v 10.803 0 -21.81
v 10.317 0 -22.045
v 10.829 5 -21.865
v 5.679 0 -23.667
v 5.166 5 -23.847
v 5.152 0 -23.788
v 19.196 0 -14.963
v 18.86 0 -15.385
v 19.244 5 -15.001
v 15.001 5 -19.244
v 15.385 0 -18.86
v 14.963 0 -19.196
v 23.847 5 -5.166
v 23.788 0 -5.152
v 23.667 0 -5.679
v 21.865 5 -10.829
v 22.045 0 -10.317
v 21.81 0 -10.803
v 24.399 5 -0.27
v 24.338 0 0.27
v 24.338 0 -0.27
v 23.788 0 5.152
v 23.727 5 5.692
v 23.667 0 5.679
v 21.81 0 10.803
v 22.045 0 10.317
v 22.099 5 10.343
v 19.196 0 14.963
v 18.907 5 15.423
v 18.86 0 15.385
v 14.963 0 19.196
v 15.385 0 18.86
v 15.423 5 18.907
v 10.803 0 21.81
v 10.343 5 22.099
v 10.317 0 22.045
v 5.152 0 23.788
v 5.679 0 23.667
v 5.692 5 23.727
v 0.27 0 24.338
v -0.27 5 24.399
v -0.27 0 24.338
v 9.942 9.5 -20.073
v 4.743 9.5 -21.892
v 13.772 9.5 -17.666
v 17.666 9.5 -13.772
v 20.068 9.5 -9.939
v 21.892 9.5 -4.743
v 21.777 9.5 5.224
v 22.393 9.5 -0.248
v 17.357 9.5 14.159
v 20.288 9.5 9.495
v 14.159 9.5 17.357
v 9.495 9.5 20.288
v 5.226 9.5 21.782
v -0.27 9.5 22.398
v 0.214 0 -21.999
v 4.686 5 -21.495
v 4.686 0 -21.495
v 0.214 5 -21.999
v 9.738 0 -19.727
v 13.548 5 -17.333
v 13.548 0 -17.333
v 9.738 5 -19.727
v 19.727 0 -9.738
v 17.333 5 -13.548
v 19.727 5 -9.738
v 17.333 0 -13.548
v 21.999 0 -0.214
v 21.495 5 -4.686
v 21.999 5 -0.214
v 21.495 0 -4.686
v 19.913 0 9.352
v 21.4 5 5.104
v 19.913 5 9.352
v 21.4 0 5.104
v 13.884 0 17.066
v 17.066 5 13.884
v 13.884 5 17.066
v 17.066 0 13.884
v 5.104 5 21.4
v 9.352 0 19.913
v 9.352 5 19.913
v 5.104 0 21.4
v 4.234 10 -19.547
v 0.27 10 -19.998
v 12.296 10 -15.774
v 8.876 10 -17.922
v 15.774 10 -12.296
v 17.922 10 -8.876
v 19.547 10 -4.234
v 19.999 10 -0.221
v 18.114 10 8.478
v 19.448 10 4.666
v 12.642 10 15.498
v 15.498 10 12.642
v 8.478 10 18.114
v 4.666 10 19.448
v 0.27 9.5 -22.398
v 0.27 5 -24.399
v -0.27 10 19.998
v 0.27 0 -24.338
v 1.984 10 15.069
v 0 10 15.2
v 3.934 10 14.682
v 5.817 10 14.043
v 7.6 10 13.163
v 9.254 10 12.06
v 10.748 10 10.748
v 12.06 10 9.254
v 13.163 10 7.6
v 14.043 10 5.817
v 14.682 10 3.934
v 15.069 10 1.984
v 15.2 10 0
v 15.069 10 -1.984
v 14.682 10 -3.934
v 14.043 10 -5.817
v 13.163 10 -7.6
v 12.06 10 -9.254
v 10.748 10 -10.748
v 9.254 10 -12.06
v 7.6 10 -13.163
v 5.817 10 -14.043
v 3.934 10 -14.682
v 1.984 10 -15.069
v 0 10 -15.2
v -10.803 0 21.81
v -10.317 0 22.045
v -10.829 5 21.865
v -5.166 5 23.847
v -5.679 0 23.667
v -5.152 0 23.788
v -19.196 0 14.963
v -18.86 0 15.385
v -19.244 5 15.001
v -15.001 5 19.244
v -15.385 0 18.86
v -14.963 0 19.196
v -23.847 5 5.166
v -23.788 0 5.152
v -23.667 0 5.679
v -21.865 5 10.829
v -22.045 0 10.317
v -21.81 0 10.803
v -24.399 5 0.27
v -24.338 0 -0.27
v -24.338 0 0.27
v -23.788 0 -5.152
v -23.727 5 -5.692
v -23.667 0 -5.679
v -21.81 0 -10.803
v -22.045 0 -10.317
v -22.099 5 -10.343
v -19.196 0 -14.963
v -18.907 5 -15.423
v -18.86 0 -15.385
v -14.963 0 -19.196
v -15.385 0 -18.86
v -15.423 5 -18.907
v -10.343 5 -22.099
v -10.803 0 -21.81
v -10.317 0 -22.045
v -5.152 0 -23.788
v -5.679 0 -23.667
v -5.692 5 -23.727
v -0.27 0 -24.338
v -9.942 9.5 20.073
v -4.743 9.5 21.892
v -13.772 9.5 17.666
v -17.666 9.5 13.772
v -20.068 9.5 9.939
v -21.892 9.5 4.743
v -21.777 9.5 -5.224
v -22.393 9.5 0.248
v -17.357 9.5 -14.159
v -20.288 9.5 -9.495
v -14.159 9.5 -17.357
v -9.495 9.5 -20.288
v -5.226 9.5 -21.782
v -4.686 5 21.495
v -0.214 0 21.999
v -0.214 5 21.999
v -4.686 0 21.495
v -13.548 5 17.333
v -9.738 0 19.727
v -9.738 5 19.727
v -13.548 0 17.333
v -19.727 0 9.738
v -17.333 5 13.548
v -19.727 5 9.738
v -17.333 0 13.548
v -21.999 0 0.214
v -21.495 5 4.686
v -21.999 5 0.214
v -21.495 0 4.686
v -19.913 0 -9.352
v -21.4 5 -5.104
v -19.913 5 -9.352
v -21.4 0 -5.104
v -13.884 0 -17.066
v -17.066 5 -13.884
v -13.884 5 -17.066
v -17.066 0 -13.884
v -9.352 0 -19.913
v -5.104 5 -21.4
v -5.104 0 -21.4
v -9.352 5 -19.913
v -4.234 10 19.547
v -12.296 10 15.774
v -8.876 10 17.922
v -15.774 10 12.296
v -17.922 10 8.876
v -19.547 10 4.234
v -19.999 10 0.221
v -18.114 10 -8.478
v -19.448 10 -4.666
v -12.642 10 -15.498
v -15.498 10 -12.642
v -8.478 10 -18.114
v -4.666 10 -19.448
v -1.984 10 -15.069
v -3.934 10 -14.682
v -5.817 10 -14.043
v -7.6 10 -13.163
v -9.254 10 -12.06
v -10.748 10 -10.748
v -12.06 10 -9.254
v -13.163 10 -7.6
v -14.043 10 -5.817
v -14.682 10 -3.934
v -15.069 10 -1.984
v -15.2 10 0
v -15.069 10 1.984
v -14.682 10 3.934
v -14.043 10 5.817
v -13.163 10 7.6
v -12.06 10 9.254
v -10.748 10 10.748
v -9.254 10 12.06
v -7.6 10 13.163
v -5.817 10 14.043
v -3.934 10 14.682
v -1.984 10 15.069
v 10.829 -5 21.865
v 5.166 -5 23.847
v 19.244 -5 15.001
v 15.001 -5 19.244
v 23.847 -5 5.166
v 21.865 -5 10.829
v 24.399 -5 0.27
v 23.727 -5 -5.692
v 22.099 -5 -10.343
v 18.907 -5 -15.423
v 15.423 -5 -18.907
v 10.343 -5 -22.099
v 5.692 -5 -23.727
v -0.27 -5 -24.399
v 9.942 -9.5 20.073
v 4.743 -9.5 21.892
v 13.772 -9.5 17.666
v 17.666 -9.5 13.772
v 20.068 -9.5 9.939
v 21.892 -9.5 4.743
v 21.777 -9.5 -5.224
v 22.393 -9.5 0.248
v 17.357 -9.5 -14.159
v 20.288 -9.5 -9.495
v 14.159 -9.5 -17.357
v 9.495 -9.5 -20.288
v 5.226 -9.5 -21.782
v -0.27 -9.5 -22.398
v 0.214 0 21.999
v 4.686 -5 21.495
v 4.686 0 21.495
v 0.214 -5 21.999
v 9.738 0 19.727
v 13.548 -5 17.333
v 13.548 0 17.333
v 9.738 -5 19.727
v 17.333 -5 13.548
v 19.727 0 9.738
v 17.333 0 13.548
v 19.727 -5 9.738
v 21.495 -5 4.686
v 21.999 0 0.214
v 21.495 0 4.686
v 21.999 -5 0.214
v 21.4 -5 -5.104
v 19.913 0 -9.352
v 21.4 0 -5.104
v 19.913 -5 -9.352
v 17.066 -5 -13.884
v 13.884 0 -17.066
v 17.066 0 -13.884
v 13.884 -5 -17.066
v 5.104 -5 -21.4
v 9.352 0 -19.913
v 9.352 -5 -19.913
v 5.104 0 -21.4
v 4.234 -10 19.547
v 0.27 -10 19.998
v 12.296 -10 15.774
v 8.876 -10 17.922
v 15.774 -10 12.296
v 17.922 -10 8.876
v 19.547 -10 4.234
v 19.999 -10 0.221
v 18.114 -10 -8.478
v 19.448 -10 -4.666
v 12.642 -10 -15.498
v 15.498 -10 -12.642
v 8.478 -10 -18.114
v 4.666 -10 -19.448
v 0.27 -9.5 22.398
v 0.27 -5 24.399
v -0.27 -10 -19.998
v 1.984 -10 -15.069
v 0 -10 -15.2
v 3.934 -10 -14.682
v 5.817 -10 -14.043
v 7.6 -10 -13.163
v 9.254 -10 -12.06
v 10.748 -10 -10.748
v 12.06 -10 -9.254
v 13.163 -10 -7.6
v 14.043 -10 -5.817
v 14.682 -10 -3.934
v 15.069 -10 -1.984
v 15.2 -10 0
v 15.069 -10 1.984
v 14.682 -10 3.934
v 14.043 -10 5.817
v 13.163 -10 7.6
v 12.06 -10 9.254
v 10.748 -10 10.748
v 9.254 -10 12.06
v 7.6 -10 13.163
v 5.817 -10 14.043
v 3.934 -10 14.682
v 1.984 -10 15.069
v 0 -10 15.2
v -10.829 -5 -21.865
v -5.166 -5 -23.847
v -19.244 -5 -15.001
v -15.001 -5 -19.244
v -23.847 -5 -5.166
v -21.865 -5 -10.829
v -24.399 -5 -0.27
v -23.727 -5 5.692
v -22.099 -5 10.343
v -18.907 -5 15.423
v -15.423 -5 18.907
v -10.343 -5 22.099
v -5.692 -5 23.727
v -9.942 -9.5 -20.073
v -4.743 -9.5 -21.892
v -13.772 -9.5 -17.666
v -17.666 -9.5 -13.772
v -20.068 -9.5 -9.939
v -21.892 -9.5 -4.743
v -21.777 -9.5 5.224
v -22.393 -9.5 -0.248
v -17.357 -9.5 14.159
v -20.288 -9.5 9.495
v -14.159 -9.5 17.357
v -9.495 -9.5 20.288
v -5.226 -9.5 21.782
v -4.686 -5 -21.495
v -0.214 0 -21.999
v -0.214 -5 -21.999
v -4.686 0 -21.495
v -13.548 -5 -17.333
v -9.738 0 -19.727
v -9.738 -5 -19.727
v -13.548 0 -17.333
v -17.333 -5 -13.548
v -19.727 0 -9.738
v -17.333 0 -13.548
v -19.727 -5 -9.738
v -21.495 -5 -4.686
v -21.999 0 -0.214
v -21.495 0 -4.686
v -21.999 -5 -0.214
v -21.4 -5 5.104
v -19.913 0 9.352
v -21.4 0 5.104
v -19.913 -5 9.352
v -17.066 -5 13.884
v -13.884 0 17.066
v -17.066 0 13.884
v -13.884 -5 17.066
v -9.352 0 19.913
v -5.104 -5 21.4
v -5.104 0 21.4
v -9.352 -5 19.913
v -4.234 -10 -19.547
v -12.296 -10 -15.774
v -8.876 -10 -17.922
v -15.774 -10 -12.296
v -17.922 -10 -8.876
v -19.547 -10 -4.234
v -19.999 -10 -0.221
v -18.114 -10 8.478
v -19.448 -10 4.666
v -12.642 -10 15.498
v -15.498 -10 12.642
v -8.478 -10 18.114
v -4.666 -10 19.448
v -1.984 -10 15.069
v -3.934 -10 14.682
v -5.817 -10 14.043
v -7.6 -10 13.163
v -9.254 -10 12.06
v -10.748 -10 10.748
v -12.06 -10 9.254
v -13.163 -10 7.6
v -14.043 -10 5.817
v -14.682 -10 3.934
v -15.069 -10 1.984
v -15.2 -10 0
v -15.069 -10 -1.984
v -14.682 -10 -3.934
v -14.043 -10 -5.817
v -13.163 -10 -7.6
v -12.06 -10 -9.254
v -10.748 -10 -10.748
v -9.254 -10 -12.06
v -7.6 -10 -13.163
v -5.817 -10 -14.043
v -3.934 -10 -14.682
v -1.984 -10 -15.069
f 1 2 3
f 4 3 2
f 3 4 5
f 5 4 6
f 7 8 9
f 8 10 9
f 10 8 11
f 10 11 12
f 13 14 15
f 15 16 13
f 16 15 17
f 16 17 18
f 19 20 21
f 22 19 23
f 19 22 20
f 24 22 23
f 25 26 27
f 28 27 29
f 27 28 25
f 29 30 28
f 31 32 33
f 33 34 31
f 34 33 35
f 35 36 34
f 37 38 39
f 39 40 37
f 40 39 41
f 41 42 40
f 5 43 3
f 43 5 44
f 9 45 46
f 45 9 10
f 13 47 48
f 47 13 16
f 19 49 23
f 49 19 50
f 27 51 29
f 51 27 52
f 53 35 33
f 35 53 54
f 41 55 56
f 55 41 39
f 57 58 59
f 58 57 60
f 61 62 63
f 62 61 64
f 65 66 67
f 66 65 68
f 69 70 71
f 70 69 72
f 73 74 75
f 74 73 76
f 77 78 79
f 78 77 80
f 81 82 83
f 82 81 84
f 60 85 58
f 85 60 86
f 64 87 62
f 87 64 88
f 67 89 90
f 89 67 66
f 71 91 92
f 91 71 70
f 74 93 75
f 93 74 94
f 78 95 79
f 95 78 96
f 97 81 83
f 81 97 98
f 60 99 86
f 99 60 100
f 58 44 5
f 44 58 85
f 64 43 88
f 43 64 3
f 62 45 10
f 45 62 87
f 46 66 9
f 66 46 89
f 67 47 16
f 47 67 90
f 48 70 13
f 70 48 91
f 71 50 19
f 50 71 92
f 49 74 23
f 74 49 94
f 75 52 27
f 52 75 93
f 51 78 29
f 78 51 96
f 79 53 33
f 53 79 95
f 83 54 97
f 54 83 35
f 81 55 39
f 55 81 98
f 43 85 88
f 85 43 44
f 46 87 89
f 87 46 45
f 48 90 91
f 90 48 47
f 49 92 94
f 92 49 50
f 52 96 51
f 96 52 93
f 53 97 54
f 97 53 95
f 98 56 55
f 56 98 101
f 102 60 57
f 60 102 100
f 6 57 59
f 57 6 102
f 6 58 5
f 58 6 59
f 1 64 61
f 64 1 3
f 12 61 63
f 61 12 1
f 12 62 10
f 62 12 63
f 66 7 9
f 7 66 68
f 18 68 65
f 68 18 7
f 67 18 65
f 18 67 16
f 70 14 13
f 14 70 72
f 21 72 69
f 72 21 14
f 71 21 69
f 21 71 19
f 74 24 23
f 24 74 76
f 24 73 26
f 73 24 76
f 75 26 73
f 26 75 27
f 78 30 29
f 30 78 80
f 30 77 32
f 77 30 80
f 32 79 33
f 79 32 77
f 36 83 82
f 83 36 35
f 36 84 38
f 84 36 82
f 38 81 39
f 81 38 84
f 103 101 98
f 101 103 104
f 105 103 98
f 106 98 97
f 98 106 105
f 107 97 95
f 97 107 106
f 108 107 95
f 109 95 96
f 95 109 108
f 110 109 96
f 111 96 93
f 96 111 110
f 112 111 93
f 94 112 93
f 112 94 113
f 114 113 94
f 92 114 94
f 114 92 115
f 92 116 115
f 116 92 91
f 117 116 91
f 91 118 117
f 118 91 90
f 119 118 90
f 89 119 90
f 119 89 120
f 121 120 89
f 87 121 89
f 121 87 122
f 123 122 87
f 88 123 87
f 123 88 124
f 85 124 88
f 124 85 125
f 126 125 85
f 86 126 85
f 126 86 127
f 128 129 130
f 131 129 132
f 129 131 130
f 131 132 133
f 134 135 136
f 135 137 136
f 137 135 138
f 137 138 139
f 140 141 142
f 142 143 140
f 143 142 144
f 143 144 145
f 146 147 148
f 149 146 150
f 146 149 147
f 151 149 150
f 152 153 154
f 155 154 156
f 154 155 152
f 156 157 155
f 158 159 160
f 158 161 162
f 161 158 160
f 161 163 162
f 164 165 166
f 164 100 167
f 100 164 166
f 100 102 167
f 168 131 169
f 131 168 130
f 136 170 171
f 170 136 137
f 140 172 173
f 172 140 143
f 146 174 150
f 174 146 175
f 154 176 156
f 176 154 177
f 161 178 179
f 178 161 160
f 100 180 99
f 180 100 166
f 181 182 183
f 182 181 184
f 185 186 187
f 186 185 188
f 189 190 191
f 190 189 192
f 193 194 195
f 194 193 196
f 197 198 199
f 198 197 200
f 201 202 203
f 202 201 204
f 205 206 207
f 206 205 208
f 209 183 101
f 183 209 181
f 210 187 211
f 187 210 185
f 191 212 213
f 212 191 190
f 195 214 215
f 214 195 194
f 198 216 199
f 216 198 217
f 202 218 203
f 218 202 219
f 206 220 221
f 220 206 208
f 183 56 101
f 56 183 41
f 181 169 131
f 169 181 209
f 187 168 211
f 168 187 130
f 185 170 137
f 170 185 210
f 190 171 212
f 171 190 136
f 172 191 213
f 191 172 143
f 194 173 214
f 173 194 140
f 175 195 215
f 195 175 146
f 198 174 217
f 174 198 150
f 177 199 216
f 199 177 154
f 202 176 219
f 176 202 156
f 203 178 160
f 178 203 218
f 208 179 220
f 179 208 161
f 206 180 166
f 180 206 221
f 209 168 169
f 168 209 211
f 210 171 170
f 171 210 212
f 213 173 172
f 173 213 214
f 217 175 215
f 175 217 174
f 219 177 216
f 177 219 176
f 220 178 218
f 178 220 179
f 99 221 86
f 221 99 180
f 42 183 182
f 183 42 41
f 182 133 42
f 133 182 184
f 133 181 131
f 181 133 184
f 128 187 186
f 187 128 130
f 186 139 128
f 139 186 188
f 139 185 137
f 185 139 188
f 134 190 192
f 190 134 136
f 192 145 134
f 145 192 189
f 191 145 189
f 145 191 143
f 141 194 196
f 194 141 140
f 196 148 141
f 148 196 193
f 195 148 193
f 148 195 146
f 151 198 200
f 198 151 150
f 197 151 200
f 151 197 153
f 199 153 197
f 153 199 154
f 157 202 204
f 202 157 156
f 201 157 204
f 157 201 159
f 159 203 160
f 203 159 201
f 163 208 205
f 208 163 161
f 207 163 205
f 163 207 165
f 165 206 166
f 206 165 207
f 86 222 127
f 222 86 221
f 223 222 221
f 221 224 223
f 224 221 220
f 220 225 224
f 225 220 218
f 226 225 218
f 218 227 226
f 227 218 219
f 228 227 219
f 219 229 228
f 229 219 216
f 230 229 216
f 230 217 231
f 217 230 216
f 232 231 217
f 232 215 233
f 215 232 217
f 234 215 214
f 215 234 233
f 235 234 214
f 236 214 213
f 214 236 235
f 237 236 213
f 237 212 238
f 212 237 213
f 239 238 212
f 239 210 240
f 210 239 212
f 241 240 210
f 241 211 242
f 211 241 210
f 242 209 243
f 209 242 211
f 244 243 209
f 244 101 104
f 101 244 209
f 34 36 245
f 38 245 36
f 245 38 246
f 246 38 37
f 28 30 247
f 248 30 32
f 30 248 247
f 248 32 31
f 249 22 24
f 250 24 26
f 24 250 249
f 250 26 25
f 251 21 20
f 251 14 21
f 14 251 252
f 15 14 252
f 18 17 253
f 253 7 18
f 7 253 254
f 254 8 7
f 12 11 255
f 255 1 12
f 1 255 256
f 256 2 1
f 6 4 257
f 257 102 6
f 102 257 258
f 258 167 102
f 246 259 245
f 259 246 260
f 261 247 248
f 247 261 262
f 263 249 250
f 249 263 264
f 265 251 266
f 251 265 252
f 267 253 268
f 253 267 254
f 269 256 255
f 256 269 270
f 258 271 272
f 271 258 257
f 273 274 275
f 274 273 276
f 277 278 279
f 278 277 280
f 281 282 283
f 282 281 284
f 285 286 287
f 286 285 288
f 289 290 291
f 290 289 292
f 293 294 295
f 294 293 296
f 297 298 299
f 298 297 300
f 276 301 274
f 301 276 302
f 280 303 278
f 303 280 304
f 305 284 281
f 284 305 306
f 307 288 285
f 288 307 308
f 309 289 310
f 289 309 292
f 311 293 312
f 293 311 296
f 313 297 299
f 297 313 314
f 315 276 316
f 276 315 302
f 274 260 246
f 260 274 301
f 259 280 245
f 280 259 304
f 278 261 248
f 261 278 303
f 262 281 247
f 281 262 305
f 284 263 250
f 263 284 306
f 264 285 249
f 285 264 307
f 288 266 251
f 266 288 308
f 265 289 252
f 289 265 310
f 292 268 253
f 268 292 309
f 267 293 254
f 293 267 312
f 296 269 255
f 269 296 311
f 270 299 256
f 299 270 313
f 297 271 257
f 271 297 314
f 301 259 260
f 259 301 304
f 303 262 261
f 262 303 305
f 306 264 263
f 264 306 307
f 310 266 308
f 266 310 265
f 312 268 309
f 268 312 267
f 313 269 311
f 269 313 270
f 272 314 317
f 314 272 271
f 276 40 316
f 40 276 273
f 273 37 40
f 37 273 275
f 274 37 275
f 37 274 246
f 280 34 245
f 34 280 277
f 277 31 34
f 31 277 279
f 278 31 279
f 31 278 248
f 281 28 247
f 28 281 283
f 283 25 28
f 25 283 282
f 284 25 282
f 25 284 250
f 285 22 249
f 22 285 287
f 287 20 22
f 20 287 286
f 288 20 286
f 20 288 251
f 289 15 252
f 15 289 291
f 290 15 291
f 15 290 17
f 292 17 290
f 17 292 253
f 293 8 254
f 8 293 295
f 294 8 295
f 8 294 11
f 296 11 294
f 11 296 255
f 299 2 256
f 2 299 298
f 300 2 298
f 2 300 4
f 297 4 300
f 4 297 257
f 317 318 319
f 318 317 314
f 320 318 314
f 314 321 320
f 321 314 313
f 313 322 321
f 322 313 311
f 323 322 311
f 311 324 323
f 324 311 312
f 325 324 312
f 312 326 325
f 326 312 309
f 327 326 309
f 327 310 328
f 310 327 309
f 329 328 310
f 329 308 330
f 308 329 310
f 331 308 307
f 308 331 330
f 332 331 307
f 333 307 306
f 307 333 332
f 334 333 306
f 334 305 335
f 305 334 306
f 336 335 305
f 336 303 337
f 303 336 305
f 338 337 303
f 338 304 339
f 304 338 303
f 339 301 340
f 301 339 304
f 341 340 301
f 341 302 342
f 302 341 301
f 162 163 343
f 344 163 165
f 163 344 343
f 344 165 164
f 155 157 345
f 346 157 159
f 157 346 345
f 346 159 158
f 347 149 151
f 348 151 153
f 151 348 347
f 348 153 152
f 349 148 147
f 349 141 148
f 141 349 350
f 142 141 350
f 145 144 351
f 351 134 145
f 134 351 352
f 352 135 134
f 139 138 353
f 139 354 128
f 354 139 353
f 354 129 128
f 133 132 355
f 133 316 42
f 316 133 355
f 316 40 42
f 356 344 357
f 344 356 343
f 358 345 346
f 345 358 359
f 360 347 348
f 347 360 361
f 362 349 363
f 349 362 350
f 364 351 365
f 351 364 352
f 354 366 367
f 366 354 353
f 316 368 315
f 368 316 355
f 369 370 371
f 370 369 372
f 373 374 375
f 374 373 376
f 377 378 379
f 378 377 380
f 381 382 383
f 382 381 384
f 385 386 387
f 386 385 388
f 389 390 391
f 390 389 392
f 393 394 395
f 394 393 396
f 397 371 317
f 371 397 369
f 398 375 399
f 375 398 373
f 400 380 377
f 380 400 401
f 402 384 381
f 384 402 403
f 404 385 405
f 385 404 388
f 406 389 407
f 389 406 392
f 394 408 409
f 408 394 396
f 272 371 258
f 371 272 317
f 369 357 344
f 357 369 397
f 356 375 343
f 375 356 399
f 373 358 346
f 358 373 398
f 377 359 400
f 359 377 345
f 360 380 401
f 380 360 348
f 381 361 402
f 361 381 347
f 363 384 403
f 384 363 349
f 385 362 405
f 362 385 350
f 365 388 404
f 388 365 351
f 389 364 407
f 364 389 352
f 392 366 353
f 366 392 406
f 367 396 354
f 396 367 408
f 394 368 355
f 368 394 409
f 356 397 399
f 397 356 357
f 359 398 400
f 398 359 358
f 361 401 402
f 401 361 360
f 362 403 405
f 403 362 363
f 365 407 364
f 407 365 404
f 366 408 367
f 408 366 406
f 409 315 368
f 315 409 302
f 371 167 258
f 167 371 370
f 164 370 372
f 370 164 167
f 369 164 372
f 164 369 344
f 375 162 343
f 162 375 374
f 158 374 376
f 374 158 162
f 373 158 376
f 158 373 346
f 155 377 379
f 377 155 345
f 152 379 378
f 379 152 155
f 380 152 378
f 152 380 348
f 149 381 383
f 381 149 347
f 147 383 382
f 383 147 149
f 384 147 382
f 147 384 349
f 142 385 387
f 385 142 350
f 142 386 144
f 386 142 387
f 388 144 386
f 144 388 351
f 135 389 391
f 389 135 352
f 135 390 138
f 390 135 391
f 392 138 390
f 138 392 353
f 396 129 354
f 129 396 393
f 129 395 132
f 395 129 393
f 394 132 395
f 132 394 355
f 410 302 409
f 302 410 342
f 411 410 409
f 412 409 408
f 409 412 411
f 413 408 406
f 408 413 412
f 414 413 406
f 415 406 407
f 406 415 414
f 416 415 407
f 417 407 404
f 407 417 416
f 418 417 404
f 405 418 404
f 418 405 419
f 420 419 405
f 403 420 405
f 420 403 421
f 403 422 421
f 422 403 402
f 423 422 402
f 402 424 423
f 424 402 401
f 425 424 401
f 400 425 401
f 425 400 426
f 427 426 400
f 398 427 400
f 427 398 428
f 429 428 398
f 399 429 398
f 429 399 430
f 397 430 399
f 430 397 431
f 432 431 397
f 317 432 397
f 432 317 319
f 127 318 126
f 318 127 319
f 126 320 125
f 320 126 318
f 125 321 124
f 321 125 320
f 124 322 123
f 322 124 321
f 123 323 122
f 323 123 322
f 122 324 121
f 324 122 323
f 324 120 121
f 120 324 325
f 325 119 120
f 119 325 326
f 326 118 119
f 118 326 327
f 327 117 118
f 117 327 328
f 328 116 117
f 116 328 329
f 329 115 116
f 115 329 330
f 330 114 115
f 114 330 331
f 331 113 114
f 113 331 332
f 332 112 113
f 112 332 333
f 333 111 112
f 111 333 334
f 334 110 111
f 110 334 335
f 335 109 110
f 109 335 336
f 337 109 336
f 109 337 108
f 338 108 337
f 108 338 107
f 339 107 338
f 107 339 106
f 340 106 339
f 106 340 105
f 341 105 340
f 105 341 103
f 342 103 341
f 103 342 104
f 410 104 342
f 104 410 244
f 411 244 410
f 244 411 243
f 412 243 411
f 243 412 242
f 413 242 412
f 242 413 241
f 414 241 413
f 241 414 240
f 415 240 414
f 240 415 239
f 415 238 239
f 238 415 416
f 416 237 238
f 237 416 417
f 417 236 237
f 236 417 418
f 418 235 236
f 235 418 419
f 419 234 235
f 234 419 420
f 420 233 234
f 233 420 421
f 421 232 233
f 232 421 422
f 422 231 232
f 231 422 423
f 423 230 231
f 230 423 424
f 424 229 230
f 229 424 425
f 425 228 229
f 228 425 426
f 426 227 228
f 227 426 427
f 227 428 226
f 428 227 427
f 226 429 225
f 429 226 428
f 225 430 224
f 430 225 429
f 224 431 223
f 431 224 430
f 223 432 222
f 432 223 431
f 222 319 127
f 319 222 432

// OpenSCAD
use <../lib.scad>
use <../p/48/4-4cylo.scad>
use <s/2857s01.scad>
$fa=1; $fs=0.2;
function ldraw_lib__2857(realsolid=false) = [
// 0 Tyre 20/ 46 x 30 Off Road
// 0 Name: 2857.dat
// 0 Author: Max Martin Richter [MMR1988]
// 0 !LDRAW_ORG Part UPDATE 2017-01
// 0 !LICENSE Licensed under CC BY 2.0 and CC BY 4.0 : see CAreadme.txt
// 
// 0 BFC CERTIFY CCW
  [0,"BFC","CERTIFY"],
  [0,"BFC","CCW"],
// 
// 0 !KEYWORDS 20 x 30, solid
// 
// 0 !HISTORY 2017-12-30 [PTadmin] Official Update 2017-01
// 
// 
// 1 16 0 0 0 0 0 1 0 1 0 -1 0 0 s\2857s01.dat
  [1,16,0,0,0,0,0,1,0,1,0,-1,0,0, ldraw_lib__s__2857s01(realsolid)],
// 1 16 0 0 0 0 0 -1 0 -1 0 -1 0 0 s\2857s01.dat
  [1,16,0,0,0,0,0,-1,0,-1,0,-1,0,0, ldraw_lib__s__2857s01(realsolid)],
// 1 16 0 0 0 0 0 1 0 -1 0 1 0 0 s\2857s01.dat
  [1,16,0,0,0,0,0,1,0,-1,0,1,0,0, ldraw_lib__s__2857s01(realsolid)],
// 1 16 0 0 0 0 0 -1 0 1 0 1 0 0 s\2857s01.dat
  [1,16,0,0,0,0,0,-1,0,1,0,1,0,0, ldraw_lib__s__2857s01(realsolid)],
// 
// 0 BFC INVERTNEXT
  [0,"BFC","INVERTNEXT"],
// 1 16 0 0 -25 0 0 38 38 0 0 0 50 0 48\4-4cylo.dat
  [1,16,0,0,-25,0,0,38,38,0,0,0,50,0, ldraw_lib__48__4_4cylo(realsolid)],
];
module ldraw_lib__2857(step=0, col=false, unit=2/5, alt=false, line=0.2, solid=!$preview)
    makepoly(ldraw_lib__2857(solid), step=step, col=col, unit=unit, alt=alt, line=line, solid=solid);
ldraw_lib__2857(line=0.2);
